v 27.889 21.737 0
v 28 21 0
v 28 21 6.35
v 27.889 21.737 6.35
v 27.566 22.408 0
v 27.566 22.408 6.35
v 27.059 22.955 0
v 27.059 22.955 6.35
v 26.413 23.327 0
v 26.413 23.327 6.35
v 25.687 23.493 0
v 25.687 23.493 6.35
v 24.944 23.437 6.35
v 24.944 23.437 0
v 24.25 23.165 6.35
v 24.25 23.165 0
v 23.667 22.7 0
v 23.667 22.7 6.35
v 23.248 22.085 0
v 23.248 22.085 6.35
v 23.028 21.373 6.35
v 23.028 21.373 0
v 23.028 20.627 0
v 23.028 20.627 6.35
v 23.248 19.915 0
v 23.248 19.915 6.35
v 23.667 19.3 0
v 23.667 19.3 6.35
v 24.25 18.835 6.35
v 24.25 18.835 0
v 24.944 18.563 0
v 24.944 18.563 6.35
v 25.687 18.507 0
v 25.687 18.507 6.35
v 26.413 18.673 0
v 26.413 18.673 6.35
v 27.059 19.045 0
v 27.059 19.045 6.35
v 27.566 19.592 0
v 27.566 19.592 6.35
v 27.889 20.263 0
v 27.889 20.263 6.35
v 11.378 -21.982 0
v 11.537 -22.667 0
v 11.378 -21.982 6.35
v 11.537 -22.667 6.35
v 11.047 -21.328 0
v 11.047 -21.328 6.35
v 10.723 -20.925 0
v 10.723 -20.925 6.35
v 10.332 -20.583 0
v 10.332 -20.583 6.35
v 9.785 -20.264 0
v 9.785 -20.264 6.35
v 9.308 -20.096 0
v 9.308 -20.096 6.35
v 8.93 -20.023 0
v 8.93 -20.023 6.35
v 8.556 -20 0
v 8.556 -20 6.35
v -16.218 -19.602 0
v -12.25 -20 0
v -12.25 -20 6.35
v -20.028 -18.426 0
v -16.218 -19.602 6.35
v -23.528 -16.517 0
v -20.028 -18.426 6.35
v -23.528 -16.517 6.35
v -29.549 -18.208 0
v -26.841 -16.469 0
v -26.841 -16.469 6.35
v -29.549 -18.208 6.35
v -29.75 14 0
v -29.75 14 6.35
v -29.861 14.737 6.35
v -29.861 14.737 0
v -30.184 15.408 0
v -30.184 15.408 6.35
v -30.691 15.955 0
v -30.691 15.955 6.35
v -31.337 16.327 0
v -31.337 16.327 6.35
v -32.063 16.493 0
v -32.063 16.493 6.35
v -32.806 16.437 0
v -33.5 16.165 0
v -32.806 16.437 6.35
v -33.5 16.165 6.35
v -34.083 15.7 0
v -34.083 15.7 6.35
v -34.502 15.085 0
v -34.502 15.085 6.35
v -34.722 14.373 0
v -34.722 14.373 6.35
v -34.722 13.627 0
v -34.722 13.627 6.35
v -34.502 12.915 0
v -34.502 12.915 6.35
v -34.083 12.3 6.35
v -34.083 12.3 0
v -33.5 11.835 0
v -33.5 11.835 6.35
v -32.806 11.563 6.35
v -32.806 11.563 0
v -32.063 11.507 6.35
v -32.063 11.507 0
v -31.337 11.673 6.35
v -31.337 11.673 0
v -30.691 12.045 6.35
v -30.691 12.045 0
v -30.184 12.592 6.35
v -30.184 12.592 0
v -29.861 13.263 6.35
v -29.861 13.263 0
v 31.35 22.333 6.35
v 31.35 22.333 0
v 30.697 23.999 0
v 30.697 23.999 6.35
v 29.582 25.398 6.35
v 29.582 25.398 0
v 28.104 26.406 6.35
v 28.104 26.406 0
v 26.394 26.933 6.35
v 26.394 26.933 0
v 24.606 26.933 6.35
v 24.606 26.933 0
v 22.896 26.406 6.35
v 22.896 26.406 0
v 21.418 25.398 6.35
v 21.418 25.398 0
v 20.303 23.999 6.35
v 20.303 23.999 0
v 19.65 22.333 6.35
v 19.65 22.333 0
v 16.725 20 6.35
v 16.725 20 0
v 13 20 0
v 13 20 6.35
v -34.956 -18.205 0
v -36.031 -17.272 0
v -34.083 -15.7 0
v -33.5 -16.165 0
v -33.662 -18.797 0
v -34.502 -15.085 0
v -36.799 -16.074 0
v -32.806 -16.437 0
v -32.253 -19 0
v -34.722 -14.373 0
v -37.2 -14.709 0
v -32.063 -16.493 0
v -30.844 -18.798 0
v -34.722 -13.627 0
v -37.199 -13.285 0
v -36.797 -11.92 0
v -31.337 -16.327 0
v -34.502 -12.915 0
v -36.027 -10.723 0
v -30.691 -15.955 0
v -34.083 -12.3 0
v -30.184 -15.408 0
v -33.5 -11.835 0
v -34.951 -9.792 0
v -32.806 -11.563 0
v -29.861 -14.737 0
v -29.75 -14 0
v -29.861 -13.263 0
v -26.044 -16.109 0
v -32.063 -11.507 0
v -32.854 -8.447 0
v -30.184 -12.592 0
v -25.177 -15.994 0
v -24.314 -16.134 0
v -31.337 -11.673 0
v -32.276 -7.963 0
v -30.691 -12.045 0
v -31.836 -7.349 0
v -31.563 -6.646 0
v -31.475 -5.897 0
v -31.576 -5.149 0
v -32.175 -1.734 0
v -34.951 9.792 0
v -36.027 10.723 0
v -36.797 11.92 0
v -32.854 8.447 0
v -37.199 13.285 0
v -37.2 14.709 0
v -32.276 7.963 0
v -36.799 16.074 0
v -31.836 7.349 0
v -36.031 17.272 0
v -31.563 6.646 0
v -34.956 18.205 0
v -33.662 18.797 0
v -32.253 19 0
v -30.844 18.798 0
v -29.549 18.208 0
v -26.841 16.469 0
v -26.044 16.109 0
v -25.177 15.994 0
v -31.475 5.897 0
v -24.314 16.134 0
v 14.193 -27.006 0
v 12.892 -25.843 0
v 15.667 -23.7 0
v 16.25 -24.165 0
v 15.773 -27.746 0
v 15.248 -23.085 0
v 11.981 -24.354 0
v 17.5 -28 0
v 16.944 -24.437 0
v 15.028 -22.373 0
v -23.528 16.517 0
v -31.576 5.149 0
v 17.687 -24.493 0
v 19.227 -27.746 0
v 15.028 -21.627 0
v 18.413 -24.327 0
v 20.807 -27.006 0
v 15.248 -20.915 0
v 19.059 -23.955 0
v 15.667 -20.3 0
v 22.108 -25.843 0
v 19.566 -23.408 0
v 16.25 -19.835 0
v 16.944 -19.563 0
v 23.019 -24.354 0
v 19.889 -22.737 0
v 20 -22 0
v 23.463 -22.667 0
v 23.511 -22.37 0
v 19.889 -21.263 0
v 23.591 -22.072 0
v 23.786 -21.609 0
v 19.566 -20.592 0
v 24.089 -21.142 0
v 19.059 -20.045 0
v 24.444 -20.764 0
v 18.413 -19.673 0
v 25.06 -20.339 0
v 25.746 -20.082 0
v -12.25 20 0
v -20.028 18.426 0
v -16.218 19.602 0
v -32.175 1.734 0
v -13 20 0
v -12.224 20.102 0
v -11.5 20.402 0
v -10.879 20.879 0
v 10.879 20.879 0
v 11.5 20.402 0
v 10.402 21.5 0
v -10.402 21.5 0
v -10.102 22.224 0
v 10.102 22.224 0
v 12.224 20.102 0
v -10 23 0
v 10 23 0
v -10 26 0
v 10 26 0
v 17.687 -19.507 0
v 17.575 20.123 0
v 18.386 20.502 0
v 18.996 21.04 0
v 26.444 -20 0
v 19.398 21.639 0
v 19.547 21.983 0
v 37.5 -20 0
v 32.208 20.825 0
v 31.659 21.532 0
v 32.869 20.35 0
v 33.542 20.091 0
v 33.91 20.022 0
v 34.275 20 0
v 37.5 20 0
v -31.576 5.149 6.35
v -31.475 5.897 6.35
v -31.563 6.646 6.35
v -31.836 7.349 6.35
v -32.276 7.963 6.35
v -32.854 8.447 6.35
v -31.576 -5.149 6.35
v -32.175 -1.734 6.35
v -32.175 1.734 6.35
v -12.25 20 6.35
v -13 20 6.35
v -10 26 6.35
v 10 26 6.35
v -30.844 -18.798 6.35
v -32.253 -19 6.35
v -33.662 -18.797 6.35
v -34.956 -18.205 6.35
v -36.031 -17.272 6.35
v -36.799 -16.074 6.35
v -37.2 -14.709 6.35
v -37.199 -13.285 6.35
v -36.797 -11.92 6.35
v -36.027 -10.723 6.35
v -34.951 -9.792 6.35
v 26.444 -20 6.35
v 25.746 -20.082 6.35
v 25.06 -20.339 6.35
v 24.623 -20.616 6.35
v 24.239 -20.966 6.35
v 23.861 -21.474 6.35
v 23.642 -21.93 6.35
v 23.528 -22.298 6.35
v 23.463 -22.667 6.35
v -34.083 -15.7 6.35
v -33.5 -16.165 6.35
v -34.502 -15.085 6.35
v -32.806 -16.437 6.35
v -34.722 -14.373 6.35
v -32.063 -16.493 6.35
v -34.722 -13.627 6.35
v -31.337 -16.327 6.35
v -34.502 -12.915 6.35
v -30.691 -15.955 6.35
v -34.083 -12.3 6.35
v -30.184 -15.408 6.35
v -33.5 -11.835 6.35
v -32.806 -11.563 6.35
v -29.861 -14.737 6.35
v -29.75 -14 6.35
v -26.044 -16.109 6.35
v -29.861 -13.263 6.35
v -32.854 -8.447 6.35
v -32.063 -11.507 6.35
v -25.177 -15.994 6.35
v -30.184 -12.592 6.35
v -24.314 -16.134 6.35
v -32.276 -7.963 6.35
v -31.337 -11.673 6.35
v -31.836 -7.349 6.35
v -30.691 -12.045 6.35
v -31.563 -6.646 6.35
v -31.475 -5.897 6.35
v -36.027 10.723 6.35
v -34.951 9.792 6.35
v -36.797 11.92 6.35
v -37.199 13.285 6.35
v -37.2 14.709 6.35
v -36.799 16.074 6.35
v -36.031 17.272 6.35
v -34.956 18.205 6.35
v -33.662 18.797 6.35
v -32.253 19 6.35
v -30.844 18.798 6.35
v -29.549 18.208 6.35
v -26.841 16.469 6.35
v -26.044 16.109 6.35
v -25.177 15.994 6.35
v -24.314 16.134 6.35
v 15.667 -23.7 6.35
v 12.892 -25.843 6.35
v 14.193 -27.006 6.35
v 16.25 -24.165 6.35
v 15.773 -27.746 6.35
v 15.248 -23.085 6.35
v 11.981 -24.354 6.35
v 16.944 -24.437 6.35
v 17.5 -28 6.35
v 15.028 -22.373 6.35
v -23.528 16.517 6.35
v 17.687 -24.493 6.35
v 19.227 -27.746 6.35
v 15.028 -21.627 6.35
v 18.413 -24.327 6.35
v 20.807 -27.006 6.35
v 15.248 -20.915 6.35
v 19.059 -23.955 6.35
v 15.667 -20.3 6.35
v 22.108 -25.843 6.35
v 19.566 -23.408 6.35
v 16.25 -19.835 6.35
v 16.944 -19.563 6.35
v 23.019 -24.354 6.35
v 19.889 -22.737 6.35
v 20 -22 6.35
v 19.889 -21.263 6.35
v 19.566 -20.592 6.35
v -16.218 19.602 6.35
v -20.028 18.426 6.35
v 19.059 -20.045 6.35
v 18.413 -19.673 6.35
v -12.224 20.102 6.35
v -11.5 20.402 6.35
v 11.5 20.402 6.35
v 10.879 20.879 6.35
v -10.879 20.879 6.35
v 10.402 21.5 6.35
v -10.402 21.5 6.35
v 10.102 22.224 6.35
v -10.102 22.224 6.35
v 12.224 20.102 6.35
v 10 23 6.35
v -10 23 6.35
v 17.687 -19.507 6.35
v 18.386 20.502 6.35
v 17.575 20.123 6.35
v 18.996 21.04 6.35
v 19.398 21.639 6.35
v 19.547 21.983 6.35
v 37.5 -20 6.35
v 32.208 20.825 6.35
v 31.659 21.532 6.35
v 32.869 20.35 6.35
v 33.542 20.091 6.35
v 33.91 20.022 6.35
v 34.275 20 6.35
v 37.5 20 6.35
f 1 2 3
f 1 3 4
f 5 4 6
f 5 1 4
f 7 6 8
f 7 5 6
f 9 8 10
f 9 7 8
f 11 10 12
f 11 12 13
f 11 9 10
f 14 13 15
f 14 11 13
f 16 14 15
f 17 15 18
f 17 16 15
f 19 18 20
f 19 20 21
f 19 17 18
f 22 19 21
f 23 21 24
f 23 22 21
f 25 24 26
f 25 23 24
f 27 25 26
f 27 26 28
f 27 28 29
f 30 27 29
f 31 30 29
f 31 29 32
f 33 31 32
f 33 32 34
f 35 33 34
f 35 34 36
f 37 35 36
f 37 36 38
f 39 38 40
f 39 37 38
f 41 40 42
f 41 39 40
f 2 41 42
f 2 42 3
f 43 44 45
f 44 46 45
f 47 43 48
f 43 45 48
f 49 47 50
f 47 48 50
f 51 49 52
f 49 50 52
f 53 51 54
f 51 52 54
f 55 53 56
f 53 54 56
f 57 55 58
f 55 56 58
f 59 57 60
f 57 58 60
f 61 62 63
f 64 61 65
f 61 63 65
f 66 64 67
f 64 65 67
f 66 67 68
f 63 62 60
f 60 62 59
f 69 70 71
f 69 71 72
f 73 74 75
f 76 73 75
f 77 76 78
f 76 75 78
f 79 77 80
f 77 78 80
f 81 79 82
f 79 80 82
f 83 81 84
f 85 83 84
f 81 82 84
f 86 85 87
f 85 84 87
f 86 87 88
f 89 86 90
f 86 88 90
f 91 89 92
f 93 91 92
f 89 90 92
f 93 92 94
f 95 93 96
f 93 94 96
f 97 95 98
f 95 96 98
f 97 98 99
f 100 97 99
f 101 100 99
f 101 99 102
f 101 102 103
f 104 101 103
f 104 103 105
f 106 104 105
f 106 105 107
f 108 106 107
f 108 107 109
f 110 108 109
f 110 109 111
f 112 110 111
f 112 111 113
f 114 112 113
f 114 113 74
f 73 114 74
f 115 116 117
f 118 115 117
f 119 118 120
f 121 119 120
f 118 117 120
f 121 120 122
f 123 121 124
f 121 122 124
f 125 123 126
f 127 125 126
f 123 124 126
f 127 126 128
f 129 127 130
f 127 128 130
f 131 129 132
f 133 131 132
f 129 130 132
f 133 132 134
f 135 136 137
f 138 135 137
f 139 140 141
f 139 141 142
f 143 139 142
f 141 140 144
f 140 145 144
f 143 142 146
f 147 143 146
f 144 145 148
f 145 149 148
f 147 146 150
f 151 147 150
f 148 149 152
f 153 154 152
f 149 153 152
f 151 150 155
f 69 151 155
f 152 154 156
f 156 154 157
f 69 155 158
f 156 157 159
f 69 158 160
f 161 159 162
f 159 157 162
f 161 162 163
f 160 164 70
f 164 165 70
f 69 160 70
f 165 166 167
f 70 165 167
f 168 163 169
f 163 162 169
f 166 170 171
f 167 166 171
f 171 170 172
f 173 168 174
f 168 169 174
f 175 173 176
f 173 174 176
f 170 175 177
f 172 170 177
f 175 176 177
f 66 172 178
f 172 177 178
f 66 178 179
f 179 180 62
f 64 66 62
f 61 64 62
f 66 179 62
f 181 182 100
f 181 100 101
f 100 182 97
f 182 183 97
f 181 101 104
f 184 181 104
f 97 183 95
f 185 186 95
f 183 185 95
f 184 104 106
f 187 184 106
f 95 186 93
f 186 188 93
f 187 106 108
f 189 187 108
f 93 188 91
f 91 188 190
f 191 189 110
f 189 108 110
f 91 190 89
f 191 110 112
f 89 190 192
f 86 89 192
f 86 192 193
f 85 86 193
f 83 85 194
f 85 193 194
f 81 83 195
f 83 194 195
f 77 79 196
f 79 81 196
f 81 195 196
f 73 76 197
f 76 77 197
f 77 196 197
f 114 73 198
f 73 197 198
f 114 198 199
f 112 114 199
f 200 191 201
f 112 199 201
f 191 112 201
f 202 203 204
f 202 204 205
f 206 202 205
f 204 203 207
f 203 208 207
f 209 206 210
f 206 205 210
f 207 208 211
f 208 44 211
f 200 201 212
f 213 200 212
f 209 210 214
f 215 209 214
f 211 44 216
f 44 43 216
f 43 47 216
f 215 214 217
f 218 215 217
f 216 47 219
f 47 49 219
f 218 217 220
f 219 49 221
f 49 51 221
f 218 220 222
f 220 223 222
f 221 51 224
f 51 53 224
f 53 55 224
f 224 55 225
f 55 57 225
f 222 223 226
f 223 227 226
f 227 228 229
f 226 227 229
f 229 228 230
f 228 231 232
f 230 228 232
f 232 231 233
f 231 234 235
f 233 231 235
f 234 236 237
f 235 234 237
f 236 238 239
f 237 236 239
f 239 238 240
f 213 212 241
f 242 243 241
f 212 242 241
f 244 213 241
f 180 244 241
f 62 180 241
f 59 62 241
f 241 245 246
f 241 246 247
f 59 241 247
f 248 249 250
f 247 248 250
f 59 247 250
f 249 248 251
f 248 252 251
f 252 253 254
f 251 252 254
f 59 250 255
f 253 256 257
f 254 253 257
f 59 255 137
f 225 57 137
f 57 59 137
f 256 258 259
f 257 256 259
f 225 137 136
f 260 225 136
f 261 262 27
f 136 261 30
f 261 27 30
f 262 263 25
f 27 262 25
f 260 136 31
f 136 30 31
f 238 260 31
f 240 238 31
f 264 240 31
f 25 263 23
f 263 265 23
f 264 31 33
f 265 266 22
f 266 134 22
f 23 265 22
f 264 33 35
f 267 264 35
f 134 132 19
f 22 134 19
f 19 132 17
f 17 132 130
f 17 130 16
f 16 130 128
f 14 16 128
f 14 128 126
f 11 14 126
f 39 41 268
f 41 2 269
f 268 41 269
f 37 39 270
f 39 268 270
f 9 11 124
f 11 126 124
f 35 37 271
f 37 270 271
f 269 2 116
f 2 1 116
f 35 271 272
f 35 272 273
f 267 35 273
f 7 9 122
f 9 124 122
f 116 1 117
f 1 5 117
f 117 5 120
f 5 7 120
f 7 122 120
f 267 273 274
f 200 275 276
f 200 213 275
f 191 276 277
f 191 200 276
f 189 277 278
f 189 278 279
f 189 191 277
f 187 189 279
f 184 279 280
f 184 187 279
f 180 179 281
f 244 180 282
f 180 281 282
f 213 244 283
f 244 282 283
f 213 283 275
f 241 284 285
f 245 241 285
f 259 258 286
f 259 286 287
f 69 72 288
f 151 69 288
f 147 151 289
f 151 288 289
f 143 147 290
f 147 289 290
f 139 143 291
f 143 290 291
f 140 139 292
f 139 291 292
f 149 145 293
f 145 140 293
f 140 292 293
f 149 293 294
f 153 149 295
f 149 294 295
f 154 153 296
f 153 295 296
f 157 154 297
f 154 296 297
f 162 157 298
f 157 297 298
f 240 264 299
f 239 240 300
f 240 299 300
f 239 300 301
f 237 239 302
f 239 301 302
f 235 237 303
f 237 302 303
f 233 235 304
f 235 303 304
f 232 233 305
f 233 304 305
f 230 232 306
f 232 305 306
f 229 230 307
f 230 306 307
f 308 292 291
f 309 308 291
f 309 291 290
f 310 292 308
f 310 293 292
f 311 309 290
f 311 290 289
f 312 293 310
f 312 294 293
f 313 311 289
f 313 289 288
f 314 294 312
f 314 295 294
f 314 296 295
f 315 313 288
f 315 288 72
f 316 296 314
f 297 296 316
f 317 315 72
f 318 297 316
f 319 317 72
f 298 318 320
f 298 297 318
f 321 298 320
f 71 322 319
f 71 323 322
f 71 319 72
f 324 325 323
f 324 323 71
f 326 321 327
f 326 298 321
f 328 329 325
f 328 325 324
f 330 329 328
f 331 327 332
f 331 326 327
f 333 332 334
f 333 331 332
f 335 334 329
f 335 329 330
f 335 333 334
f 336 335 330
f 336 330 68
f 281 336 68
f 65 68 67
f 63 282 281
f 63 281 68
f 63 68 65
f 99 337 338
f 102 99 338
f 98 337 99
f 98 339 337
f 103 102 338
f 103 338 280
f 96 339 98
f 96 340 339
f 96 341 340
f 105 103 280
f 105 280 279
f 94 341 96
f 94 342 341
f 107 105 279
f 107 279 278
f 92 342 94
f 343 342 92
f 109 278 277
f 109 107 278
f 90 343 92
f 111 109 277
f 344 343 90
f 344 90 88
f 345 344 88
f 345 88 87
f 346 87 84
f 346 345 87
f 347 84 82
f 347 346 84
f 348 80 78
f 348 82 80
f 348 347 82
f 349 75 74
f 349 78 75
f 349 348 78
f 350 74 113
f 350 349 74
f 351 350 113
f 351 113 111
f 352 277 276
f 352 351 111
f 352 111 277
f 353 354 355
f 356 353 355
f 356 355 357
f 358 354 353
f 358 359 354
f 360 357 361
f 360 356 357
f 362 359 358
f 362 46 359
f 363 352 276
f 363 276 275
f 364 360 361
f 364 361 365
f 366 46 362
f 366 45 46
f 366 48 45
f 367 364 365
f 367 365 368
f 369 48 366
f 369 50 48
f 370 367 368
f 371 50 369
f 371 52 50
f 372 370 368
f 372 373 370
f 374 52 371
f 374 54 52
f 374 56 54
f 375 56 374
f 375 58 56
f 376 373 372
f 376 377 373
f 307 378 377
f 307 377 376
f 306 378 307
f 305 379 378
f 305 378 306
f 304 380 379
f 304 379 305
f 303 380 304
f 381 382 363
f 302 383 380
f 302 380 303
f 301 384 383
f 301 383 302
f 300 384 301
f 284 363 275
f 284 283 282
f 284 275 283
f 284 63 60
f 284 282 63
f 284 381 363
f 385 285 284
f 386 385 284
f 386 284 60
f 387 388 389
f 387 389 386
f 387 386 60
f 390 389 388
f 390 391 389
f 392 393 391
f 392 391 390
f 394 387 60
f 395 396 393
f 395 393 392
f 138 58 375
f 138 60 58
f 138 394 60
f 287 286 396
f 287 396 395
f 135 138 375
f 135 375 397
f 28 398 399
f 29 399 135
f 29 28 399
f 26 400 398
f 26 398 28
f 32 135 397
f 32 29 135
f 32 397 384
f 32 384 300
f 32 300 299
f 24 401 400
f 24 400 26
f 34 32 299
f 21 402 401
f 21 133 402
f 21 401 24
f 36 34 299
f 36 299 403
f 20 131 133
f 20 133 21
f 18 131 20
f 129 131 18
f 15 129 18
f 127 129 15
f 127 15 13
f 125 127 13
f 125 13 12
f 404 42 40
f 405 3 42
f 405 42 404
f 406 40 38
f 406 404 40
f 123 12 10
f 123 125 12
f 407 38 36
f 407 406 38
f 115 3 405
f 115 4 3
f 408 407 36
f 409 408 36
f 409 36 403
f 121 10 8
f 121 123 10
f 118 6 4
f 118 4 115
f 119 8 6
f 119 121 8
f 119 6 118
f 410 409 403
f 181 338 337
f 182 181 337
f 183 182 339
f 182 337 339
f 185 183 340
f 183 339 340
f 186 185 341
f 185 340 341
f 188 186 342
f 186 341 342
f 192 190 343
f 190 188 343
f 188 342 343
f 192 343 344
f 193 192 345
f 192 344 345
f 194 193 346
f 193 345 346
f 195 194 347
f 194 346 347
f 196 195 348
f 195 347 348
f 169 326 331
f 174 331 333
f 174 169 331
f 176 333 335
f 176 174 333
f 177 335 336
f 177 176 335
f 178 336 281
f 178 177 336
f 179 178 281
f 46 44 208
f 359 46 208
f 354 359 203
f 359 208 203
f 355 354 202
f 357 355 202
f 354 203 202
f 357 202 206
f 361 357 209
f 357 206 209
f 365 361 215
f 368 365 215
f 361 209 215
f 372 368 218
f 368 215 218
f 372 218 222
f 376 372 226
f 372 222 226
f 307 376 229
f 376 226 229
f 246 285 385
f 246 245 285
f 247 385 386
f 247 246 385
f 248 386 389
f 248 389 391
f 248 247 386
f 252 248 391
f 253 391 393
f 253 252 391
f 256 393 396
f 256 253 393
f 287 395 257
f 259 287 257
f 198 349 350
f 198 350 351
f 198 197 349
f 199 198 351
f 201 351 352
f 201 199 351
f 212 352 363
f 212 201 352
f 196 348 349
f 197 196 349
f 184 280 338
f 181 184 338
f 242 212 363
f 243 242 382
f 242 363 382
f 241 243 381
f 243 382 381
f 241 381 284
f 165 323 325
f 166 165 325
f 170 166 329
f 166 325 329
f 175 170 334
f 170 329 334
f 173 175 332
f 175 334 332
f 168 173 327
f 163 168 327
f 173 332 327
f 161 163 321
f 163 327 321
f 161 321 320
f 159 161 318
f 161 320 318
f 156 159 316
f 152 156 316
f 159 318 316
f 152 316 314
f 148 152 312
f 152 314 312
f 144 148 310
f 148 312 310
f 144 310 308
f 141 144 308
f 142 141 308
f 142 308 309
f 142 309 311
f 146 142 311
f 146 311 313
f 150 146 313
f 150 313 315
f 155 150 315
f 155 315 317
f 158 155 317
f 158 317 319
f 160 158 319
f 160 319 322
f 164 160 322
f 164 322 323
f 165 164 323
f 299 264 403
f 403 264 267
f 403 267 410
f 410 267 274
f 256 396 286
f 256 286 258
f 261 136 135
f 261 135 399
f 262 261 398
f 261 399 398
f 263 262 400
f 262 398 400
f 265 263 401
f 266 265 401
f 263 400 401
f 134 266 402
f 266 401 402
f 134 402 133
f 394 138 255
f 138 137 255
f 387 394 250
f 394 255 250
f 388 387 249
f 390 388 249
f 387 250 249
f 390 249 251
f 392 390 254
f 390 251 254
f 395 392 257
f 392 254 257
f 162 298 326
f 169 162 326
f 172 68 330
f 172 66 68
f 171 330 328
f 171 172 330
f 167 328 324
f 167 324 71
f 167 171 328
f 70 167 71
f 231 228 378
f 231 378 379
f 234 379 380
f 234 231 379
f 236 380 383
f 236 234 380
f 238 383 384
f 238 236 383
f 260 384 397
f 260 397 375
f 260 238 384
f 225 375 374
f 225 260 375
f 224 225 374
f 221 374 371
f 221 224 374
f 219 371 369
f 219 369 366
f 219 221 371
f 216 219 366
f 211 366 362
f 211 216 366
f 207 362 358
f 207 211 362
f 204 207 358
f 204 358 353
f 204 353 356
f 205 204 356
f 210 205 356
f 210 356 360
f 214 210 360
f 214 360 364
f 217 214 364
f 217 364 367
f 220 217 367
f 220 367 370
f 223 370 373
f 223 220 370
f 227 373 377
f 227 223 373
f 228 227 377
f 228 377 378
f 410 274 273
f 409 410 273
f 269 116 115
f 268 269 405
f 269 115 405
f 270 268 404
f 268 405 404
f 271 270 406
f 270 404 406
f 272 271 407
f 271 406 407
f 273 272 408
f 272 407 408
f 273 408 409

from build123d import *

# Parameters (mm, degrees)
SKETCH1_R               = 2.5
BOSS_EXTRUDE1_DEPTH     = 6.35
SKETCH12_W              = 20
SKETCH12_H              = 6.35
BOSS_EXTRUDE2_DEPTH     = 6
FILLET2_R               = 3
SKETCH13_R              = 2.5
CUT_EXTRUDE9_DEPTH      = 1
CUT_EXTRUDE9_DEPTH_BACK = 7.35
FILLET1_R               = 3


with BuildPart() as part:
    # Sketch1 → Boss-Extrude1 (new body)
    with BuildSketch(Plane.XY):
        with BuildLine():
            Line((-37.5, -20), (11.5, -20))
            Line((11.5, -20), (11.5, -22))
            ThreePointArc((11.5, -22), (17.5, -28), (23.5, -22))
            Line((23.5, -22), (23.5, -20))
            Line((23.5, -20), (37.5, -20))
            Line((37.5, -20), (37.5, 20))
            Line((37.5, 20), (31.5, 20))
            Line((31.5, 20), (31.5, 21))
            ThreePointArc((31.5, 21), (25.5, 27), (19.5, 21))
            Line((19.5, 21), (19.5, 20))
            Line((19.5, 20), (-37.5, 20))
            Line((-37.5, 20), (-37.5, -20))
        make_face()
        with Locations((25.5, 21)):
            Circle(SKETCH1_R, mode=Mode.SUBTRACT)
        with Locations((17.5, -22)):
            Circle(SKETCH1_R, mode=Mode.SUBTRACT)
    extrude(amount=BOSS_EXTRUDE1_DEPTH)

    # Sketch12 → Boss-Extrude2 (add)
    with BuildSketch(Plane(origin=(0, 20, 0), x_dir=(1, 0, 0), z_dir=(0, 1, 0))):
        with Locations((0, -3.175)):
            Rectangle(SKETCH12_W, SKETCH12_H)
    extrude(amount=BOSS_EXTRUDE2_DEPTH)

    # Fillet2
    fillet2_edges = [part.edges().sort_by_distance(p)[0] for p in [
        (10, 20, 3.175),
        (-10, 20, 3.175),
    ]]
    fillet(fillet2_edges, radius=FILLET2_R)

    # Sketch13 → Cut-Extrude9 (cut, two sides)
    with BuildSketch(Plane.XY.offset(6.35)) as cut_extrude9_sk:
        with BuildLine():
            Line((-12.25, 20), (-37.5, 20))
            Line((-37.5, 20), (-37.5, -20))
            Line((-37.5, -20), (-12.25, -20))
            ThreePointArc((-12.25, -20), (-19.075859236, -18.799139494), (-25.082027993, -15.34076457))
            Line((-25.082027993, -15.34076457), (-29.549349609, -18.20790773))
            ThreePointArc((-29.549349609, -18.20790773), (-36.45790773, -16.700650391), (-34.950650391, -9.79209227))
            Line((-34.950650391, -9.79209227), (-30.909610133, -7.198538025))
            ThreePointArc((-30.909610133, -7.198538025), (-32.25, 0), (-30.909610133, 7.198538025))
            Line((-30.909610133, 7.198538025), (-34.950650391, 9.79209227))
            ThreePointArc((-34.950650391, 9.79209227), (-36.45790773, 16.700650391), (-29.549349609, 18.20790773))
            Line((-29.549349609, 18.20790773), (-25.082027993, 15.34076457))
            ThreePointArc((-25.082027993, 15.34076457), (-19.075859236, 18.799139494), (-12.25, 20))
        make_face()
        with Locations((-32.25, 14)):
            Circle(SKETCH13_R)
        with Locations((-32.25, -14)):
            Circle(SKETCH13_R)
    extrude(amount=CUT_EXTRUDE9_DEPTH, mode=Mode.SUBTRACT)
    extrude(cut_extrude9_sk.sketch, amount=-CUT_EXTRUDE9_DEPTH_BACK, mode=Mode.SUBTRACT)

    # Fillet1
    fillet1_edges = [part.edges().sort_by_distance(p)[0] for p in [
        (11.5, -20, 3.175),
        (23.5, -20, 3.175),
        (31.5, 20, 3.175),
        (19.5, 20, 3.175),
        (-25.082027993, -15.34076457, 3.175),
        (-25.082027993, 15.34076457, 3.175),
        (-30.909610133, -7.198538025, 3.175),
        (-30.909610133, 7.198538025, 3.175),
    ]]
    fillet(fillet1_edges, radius=FILLET1_R)


solid = part.part
